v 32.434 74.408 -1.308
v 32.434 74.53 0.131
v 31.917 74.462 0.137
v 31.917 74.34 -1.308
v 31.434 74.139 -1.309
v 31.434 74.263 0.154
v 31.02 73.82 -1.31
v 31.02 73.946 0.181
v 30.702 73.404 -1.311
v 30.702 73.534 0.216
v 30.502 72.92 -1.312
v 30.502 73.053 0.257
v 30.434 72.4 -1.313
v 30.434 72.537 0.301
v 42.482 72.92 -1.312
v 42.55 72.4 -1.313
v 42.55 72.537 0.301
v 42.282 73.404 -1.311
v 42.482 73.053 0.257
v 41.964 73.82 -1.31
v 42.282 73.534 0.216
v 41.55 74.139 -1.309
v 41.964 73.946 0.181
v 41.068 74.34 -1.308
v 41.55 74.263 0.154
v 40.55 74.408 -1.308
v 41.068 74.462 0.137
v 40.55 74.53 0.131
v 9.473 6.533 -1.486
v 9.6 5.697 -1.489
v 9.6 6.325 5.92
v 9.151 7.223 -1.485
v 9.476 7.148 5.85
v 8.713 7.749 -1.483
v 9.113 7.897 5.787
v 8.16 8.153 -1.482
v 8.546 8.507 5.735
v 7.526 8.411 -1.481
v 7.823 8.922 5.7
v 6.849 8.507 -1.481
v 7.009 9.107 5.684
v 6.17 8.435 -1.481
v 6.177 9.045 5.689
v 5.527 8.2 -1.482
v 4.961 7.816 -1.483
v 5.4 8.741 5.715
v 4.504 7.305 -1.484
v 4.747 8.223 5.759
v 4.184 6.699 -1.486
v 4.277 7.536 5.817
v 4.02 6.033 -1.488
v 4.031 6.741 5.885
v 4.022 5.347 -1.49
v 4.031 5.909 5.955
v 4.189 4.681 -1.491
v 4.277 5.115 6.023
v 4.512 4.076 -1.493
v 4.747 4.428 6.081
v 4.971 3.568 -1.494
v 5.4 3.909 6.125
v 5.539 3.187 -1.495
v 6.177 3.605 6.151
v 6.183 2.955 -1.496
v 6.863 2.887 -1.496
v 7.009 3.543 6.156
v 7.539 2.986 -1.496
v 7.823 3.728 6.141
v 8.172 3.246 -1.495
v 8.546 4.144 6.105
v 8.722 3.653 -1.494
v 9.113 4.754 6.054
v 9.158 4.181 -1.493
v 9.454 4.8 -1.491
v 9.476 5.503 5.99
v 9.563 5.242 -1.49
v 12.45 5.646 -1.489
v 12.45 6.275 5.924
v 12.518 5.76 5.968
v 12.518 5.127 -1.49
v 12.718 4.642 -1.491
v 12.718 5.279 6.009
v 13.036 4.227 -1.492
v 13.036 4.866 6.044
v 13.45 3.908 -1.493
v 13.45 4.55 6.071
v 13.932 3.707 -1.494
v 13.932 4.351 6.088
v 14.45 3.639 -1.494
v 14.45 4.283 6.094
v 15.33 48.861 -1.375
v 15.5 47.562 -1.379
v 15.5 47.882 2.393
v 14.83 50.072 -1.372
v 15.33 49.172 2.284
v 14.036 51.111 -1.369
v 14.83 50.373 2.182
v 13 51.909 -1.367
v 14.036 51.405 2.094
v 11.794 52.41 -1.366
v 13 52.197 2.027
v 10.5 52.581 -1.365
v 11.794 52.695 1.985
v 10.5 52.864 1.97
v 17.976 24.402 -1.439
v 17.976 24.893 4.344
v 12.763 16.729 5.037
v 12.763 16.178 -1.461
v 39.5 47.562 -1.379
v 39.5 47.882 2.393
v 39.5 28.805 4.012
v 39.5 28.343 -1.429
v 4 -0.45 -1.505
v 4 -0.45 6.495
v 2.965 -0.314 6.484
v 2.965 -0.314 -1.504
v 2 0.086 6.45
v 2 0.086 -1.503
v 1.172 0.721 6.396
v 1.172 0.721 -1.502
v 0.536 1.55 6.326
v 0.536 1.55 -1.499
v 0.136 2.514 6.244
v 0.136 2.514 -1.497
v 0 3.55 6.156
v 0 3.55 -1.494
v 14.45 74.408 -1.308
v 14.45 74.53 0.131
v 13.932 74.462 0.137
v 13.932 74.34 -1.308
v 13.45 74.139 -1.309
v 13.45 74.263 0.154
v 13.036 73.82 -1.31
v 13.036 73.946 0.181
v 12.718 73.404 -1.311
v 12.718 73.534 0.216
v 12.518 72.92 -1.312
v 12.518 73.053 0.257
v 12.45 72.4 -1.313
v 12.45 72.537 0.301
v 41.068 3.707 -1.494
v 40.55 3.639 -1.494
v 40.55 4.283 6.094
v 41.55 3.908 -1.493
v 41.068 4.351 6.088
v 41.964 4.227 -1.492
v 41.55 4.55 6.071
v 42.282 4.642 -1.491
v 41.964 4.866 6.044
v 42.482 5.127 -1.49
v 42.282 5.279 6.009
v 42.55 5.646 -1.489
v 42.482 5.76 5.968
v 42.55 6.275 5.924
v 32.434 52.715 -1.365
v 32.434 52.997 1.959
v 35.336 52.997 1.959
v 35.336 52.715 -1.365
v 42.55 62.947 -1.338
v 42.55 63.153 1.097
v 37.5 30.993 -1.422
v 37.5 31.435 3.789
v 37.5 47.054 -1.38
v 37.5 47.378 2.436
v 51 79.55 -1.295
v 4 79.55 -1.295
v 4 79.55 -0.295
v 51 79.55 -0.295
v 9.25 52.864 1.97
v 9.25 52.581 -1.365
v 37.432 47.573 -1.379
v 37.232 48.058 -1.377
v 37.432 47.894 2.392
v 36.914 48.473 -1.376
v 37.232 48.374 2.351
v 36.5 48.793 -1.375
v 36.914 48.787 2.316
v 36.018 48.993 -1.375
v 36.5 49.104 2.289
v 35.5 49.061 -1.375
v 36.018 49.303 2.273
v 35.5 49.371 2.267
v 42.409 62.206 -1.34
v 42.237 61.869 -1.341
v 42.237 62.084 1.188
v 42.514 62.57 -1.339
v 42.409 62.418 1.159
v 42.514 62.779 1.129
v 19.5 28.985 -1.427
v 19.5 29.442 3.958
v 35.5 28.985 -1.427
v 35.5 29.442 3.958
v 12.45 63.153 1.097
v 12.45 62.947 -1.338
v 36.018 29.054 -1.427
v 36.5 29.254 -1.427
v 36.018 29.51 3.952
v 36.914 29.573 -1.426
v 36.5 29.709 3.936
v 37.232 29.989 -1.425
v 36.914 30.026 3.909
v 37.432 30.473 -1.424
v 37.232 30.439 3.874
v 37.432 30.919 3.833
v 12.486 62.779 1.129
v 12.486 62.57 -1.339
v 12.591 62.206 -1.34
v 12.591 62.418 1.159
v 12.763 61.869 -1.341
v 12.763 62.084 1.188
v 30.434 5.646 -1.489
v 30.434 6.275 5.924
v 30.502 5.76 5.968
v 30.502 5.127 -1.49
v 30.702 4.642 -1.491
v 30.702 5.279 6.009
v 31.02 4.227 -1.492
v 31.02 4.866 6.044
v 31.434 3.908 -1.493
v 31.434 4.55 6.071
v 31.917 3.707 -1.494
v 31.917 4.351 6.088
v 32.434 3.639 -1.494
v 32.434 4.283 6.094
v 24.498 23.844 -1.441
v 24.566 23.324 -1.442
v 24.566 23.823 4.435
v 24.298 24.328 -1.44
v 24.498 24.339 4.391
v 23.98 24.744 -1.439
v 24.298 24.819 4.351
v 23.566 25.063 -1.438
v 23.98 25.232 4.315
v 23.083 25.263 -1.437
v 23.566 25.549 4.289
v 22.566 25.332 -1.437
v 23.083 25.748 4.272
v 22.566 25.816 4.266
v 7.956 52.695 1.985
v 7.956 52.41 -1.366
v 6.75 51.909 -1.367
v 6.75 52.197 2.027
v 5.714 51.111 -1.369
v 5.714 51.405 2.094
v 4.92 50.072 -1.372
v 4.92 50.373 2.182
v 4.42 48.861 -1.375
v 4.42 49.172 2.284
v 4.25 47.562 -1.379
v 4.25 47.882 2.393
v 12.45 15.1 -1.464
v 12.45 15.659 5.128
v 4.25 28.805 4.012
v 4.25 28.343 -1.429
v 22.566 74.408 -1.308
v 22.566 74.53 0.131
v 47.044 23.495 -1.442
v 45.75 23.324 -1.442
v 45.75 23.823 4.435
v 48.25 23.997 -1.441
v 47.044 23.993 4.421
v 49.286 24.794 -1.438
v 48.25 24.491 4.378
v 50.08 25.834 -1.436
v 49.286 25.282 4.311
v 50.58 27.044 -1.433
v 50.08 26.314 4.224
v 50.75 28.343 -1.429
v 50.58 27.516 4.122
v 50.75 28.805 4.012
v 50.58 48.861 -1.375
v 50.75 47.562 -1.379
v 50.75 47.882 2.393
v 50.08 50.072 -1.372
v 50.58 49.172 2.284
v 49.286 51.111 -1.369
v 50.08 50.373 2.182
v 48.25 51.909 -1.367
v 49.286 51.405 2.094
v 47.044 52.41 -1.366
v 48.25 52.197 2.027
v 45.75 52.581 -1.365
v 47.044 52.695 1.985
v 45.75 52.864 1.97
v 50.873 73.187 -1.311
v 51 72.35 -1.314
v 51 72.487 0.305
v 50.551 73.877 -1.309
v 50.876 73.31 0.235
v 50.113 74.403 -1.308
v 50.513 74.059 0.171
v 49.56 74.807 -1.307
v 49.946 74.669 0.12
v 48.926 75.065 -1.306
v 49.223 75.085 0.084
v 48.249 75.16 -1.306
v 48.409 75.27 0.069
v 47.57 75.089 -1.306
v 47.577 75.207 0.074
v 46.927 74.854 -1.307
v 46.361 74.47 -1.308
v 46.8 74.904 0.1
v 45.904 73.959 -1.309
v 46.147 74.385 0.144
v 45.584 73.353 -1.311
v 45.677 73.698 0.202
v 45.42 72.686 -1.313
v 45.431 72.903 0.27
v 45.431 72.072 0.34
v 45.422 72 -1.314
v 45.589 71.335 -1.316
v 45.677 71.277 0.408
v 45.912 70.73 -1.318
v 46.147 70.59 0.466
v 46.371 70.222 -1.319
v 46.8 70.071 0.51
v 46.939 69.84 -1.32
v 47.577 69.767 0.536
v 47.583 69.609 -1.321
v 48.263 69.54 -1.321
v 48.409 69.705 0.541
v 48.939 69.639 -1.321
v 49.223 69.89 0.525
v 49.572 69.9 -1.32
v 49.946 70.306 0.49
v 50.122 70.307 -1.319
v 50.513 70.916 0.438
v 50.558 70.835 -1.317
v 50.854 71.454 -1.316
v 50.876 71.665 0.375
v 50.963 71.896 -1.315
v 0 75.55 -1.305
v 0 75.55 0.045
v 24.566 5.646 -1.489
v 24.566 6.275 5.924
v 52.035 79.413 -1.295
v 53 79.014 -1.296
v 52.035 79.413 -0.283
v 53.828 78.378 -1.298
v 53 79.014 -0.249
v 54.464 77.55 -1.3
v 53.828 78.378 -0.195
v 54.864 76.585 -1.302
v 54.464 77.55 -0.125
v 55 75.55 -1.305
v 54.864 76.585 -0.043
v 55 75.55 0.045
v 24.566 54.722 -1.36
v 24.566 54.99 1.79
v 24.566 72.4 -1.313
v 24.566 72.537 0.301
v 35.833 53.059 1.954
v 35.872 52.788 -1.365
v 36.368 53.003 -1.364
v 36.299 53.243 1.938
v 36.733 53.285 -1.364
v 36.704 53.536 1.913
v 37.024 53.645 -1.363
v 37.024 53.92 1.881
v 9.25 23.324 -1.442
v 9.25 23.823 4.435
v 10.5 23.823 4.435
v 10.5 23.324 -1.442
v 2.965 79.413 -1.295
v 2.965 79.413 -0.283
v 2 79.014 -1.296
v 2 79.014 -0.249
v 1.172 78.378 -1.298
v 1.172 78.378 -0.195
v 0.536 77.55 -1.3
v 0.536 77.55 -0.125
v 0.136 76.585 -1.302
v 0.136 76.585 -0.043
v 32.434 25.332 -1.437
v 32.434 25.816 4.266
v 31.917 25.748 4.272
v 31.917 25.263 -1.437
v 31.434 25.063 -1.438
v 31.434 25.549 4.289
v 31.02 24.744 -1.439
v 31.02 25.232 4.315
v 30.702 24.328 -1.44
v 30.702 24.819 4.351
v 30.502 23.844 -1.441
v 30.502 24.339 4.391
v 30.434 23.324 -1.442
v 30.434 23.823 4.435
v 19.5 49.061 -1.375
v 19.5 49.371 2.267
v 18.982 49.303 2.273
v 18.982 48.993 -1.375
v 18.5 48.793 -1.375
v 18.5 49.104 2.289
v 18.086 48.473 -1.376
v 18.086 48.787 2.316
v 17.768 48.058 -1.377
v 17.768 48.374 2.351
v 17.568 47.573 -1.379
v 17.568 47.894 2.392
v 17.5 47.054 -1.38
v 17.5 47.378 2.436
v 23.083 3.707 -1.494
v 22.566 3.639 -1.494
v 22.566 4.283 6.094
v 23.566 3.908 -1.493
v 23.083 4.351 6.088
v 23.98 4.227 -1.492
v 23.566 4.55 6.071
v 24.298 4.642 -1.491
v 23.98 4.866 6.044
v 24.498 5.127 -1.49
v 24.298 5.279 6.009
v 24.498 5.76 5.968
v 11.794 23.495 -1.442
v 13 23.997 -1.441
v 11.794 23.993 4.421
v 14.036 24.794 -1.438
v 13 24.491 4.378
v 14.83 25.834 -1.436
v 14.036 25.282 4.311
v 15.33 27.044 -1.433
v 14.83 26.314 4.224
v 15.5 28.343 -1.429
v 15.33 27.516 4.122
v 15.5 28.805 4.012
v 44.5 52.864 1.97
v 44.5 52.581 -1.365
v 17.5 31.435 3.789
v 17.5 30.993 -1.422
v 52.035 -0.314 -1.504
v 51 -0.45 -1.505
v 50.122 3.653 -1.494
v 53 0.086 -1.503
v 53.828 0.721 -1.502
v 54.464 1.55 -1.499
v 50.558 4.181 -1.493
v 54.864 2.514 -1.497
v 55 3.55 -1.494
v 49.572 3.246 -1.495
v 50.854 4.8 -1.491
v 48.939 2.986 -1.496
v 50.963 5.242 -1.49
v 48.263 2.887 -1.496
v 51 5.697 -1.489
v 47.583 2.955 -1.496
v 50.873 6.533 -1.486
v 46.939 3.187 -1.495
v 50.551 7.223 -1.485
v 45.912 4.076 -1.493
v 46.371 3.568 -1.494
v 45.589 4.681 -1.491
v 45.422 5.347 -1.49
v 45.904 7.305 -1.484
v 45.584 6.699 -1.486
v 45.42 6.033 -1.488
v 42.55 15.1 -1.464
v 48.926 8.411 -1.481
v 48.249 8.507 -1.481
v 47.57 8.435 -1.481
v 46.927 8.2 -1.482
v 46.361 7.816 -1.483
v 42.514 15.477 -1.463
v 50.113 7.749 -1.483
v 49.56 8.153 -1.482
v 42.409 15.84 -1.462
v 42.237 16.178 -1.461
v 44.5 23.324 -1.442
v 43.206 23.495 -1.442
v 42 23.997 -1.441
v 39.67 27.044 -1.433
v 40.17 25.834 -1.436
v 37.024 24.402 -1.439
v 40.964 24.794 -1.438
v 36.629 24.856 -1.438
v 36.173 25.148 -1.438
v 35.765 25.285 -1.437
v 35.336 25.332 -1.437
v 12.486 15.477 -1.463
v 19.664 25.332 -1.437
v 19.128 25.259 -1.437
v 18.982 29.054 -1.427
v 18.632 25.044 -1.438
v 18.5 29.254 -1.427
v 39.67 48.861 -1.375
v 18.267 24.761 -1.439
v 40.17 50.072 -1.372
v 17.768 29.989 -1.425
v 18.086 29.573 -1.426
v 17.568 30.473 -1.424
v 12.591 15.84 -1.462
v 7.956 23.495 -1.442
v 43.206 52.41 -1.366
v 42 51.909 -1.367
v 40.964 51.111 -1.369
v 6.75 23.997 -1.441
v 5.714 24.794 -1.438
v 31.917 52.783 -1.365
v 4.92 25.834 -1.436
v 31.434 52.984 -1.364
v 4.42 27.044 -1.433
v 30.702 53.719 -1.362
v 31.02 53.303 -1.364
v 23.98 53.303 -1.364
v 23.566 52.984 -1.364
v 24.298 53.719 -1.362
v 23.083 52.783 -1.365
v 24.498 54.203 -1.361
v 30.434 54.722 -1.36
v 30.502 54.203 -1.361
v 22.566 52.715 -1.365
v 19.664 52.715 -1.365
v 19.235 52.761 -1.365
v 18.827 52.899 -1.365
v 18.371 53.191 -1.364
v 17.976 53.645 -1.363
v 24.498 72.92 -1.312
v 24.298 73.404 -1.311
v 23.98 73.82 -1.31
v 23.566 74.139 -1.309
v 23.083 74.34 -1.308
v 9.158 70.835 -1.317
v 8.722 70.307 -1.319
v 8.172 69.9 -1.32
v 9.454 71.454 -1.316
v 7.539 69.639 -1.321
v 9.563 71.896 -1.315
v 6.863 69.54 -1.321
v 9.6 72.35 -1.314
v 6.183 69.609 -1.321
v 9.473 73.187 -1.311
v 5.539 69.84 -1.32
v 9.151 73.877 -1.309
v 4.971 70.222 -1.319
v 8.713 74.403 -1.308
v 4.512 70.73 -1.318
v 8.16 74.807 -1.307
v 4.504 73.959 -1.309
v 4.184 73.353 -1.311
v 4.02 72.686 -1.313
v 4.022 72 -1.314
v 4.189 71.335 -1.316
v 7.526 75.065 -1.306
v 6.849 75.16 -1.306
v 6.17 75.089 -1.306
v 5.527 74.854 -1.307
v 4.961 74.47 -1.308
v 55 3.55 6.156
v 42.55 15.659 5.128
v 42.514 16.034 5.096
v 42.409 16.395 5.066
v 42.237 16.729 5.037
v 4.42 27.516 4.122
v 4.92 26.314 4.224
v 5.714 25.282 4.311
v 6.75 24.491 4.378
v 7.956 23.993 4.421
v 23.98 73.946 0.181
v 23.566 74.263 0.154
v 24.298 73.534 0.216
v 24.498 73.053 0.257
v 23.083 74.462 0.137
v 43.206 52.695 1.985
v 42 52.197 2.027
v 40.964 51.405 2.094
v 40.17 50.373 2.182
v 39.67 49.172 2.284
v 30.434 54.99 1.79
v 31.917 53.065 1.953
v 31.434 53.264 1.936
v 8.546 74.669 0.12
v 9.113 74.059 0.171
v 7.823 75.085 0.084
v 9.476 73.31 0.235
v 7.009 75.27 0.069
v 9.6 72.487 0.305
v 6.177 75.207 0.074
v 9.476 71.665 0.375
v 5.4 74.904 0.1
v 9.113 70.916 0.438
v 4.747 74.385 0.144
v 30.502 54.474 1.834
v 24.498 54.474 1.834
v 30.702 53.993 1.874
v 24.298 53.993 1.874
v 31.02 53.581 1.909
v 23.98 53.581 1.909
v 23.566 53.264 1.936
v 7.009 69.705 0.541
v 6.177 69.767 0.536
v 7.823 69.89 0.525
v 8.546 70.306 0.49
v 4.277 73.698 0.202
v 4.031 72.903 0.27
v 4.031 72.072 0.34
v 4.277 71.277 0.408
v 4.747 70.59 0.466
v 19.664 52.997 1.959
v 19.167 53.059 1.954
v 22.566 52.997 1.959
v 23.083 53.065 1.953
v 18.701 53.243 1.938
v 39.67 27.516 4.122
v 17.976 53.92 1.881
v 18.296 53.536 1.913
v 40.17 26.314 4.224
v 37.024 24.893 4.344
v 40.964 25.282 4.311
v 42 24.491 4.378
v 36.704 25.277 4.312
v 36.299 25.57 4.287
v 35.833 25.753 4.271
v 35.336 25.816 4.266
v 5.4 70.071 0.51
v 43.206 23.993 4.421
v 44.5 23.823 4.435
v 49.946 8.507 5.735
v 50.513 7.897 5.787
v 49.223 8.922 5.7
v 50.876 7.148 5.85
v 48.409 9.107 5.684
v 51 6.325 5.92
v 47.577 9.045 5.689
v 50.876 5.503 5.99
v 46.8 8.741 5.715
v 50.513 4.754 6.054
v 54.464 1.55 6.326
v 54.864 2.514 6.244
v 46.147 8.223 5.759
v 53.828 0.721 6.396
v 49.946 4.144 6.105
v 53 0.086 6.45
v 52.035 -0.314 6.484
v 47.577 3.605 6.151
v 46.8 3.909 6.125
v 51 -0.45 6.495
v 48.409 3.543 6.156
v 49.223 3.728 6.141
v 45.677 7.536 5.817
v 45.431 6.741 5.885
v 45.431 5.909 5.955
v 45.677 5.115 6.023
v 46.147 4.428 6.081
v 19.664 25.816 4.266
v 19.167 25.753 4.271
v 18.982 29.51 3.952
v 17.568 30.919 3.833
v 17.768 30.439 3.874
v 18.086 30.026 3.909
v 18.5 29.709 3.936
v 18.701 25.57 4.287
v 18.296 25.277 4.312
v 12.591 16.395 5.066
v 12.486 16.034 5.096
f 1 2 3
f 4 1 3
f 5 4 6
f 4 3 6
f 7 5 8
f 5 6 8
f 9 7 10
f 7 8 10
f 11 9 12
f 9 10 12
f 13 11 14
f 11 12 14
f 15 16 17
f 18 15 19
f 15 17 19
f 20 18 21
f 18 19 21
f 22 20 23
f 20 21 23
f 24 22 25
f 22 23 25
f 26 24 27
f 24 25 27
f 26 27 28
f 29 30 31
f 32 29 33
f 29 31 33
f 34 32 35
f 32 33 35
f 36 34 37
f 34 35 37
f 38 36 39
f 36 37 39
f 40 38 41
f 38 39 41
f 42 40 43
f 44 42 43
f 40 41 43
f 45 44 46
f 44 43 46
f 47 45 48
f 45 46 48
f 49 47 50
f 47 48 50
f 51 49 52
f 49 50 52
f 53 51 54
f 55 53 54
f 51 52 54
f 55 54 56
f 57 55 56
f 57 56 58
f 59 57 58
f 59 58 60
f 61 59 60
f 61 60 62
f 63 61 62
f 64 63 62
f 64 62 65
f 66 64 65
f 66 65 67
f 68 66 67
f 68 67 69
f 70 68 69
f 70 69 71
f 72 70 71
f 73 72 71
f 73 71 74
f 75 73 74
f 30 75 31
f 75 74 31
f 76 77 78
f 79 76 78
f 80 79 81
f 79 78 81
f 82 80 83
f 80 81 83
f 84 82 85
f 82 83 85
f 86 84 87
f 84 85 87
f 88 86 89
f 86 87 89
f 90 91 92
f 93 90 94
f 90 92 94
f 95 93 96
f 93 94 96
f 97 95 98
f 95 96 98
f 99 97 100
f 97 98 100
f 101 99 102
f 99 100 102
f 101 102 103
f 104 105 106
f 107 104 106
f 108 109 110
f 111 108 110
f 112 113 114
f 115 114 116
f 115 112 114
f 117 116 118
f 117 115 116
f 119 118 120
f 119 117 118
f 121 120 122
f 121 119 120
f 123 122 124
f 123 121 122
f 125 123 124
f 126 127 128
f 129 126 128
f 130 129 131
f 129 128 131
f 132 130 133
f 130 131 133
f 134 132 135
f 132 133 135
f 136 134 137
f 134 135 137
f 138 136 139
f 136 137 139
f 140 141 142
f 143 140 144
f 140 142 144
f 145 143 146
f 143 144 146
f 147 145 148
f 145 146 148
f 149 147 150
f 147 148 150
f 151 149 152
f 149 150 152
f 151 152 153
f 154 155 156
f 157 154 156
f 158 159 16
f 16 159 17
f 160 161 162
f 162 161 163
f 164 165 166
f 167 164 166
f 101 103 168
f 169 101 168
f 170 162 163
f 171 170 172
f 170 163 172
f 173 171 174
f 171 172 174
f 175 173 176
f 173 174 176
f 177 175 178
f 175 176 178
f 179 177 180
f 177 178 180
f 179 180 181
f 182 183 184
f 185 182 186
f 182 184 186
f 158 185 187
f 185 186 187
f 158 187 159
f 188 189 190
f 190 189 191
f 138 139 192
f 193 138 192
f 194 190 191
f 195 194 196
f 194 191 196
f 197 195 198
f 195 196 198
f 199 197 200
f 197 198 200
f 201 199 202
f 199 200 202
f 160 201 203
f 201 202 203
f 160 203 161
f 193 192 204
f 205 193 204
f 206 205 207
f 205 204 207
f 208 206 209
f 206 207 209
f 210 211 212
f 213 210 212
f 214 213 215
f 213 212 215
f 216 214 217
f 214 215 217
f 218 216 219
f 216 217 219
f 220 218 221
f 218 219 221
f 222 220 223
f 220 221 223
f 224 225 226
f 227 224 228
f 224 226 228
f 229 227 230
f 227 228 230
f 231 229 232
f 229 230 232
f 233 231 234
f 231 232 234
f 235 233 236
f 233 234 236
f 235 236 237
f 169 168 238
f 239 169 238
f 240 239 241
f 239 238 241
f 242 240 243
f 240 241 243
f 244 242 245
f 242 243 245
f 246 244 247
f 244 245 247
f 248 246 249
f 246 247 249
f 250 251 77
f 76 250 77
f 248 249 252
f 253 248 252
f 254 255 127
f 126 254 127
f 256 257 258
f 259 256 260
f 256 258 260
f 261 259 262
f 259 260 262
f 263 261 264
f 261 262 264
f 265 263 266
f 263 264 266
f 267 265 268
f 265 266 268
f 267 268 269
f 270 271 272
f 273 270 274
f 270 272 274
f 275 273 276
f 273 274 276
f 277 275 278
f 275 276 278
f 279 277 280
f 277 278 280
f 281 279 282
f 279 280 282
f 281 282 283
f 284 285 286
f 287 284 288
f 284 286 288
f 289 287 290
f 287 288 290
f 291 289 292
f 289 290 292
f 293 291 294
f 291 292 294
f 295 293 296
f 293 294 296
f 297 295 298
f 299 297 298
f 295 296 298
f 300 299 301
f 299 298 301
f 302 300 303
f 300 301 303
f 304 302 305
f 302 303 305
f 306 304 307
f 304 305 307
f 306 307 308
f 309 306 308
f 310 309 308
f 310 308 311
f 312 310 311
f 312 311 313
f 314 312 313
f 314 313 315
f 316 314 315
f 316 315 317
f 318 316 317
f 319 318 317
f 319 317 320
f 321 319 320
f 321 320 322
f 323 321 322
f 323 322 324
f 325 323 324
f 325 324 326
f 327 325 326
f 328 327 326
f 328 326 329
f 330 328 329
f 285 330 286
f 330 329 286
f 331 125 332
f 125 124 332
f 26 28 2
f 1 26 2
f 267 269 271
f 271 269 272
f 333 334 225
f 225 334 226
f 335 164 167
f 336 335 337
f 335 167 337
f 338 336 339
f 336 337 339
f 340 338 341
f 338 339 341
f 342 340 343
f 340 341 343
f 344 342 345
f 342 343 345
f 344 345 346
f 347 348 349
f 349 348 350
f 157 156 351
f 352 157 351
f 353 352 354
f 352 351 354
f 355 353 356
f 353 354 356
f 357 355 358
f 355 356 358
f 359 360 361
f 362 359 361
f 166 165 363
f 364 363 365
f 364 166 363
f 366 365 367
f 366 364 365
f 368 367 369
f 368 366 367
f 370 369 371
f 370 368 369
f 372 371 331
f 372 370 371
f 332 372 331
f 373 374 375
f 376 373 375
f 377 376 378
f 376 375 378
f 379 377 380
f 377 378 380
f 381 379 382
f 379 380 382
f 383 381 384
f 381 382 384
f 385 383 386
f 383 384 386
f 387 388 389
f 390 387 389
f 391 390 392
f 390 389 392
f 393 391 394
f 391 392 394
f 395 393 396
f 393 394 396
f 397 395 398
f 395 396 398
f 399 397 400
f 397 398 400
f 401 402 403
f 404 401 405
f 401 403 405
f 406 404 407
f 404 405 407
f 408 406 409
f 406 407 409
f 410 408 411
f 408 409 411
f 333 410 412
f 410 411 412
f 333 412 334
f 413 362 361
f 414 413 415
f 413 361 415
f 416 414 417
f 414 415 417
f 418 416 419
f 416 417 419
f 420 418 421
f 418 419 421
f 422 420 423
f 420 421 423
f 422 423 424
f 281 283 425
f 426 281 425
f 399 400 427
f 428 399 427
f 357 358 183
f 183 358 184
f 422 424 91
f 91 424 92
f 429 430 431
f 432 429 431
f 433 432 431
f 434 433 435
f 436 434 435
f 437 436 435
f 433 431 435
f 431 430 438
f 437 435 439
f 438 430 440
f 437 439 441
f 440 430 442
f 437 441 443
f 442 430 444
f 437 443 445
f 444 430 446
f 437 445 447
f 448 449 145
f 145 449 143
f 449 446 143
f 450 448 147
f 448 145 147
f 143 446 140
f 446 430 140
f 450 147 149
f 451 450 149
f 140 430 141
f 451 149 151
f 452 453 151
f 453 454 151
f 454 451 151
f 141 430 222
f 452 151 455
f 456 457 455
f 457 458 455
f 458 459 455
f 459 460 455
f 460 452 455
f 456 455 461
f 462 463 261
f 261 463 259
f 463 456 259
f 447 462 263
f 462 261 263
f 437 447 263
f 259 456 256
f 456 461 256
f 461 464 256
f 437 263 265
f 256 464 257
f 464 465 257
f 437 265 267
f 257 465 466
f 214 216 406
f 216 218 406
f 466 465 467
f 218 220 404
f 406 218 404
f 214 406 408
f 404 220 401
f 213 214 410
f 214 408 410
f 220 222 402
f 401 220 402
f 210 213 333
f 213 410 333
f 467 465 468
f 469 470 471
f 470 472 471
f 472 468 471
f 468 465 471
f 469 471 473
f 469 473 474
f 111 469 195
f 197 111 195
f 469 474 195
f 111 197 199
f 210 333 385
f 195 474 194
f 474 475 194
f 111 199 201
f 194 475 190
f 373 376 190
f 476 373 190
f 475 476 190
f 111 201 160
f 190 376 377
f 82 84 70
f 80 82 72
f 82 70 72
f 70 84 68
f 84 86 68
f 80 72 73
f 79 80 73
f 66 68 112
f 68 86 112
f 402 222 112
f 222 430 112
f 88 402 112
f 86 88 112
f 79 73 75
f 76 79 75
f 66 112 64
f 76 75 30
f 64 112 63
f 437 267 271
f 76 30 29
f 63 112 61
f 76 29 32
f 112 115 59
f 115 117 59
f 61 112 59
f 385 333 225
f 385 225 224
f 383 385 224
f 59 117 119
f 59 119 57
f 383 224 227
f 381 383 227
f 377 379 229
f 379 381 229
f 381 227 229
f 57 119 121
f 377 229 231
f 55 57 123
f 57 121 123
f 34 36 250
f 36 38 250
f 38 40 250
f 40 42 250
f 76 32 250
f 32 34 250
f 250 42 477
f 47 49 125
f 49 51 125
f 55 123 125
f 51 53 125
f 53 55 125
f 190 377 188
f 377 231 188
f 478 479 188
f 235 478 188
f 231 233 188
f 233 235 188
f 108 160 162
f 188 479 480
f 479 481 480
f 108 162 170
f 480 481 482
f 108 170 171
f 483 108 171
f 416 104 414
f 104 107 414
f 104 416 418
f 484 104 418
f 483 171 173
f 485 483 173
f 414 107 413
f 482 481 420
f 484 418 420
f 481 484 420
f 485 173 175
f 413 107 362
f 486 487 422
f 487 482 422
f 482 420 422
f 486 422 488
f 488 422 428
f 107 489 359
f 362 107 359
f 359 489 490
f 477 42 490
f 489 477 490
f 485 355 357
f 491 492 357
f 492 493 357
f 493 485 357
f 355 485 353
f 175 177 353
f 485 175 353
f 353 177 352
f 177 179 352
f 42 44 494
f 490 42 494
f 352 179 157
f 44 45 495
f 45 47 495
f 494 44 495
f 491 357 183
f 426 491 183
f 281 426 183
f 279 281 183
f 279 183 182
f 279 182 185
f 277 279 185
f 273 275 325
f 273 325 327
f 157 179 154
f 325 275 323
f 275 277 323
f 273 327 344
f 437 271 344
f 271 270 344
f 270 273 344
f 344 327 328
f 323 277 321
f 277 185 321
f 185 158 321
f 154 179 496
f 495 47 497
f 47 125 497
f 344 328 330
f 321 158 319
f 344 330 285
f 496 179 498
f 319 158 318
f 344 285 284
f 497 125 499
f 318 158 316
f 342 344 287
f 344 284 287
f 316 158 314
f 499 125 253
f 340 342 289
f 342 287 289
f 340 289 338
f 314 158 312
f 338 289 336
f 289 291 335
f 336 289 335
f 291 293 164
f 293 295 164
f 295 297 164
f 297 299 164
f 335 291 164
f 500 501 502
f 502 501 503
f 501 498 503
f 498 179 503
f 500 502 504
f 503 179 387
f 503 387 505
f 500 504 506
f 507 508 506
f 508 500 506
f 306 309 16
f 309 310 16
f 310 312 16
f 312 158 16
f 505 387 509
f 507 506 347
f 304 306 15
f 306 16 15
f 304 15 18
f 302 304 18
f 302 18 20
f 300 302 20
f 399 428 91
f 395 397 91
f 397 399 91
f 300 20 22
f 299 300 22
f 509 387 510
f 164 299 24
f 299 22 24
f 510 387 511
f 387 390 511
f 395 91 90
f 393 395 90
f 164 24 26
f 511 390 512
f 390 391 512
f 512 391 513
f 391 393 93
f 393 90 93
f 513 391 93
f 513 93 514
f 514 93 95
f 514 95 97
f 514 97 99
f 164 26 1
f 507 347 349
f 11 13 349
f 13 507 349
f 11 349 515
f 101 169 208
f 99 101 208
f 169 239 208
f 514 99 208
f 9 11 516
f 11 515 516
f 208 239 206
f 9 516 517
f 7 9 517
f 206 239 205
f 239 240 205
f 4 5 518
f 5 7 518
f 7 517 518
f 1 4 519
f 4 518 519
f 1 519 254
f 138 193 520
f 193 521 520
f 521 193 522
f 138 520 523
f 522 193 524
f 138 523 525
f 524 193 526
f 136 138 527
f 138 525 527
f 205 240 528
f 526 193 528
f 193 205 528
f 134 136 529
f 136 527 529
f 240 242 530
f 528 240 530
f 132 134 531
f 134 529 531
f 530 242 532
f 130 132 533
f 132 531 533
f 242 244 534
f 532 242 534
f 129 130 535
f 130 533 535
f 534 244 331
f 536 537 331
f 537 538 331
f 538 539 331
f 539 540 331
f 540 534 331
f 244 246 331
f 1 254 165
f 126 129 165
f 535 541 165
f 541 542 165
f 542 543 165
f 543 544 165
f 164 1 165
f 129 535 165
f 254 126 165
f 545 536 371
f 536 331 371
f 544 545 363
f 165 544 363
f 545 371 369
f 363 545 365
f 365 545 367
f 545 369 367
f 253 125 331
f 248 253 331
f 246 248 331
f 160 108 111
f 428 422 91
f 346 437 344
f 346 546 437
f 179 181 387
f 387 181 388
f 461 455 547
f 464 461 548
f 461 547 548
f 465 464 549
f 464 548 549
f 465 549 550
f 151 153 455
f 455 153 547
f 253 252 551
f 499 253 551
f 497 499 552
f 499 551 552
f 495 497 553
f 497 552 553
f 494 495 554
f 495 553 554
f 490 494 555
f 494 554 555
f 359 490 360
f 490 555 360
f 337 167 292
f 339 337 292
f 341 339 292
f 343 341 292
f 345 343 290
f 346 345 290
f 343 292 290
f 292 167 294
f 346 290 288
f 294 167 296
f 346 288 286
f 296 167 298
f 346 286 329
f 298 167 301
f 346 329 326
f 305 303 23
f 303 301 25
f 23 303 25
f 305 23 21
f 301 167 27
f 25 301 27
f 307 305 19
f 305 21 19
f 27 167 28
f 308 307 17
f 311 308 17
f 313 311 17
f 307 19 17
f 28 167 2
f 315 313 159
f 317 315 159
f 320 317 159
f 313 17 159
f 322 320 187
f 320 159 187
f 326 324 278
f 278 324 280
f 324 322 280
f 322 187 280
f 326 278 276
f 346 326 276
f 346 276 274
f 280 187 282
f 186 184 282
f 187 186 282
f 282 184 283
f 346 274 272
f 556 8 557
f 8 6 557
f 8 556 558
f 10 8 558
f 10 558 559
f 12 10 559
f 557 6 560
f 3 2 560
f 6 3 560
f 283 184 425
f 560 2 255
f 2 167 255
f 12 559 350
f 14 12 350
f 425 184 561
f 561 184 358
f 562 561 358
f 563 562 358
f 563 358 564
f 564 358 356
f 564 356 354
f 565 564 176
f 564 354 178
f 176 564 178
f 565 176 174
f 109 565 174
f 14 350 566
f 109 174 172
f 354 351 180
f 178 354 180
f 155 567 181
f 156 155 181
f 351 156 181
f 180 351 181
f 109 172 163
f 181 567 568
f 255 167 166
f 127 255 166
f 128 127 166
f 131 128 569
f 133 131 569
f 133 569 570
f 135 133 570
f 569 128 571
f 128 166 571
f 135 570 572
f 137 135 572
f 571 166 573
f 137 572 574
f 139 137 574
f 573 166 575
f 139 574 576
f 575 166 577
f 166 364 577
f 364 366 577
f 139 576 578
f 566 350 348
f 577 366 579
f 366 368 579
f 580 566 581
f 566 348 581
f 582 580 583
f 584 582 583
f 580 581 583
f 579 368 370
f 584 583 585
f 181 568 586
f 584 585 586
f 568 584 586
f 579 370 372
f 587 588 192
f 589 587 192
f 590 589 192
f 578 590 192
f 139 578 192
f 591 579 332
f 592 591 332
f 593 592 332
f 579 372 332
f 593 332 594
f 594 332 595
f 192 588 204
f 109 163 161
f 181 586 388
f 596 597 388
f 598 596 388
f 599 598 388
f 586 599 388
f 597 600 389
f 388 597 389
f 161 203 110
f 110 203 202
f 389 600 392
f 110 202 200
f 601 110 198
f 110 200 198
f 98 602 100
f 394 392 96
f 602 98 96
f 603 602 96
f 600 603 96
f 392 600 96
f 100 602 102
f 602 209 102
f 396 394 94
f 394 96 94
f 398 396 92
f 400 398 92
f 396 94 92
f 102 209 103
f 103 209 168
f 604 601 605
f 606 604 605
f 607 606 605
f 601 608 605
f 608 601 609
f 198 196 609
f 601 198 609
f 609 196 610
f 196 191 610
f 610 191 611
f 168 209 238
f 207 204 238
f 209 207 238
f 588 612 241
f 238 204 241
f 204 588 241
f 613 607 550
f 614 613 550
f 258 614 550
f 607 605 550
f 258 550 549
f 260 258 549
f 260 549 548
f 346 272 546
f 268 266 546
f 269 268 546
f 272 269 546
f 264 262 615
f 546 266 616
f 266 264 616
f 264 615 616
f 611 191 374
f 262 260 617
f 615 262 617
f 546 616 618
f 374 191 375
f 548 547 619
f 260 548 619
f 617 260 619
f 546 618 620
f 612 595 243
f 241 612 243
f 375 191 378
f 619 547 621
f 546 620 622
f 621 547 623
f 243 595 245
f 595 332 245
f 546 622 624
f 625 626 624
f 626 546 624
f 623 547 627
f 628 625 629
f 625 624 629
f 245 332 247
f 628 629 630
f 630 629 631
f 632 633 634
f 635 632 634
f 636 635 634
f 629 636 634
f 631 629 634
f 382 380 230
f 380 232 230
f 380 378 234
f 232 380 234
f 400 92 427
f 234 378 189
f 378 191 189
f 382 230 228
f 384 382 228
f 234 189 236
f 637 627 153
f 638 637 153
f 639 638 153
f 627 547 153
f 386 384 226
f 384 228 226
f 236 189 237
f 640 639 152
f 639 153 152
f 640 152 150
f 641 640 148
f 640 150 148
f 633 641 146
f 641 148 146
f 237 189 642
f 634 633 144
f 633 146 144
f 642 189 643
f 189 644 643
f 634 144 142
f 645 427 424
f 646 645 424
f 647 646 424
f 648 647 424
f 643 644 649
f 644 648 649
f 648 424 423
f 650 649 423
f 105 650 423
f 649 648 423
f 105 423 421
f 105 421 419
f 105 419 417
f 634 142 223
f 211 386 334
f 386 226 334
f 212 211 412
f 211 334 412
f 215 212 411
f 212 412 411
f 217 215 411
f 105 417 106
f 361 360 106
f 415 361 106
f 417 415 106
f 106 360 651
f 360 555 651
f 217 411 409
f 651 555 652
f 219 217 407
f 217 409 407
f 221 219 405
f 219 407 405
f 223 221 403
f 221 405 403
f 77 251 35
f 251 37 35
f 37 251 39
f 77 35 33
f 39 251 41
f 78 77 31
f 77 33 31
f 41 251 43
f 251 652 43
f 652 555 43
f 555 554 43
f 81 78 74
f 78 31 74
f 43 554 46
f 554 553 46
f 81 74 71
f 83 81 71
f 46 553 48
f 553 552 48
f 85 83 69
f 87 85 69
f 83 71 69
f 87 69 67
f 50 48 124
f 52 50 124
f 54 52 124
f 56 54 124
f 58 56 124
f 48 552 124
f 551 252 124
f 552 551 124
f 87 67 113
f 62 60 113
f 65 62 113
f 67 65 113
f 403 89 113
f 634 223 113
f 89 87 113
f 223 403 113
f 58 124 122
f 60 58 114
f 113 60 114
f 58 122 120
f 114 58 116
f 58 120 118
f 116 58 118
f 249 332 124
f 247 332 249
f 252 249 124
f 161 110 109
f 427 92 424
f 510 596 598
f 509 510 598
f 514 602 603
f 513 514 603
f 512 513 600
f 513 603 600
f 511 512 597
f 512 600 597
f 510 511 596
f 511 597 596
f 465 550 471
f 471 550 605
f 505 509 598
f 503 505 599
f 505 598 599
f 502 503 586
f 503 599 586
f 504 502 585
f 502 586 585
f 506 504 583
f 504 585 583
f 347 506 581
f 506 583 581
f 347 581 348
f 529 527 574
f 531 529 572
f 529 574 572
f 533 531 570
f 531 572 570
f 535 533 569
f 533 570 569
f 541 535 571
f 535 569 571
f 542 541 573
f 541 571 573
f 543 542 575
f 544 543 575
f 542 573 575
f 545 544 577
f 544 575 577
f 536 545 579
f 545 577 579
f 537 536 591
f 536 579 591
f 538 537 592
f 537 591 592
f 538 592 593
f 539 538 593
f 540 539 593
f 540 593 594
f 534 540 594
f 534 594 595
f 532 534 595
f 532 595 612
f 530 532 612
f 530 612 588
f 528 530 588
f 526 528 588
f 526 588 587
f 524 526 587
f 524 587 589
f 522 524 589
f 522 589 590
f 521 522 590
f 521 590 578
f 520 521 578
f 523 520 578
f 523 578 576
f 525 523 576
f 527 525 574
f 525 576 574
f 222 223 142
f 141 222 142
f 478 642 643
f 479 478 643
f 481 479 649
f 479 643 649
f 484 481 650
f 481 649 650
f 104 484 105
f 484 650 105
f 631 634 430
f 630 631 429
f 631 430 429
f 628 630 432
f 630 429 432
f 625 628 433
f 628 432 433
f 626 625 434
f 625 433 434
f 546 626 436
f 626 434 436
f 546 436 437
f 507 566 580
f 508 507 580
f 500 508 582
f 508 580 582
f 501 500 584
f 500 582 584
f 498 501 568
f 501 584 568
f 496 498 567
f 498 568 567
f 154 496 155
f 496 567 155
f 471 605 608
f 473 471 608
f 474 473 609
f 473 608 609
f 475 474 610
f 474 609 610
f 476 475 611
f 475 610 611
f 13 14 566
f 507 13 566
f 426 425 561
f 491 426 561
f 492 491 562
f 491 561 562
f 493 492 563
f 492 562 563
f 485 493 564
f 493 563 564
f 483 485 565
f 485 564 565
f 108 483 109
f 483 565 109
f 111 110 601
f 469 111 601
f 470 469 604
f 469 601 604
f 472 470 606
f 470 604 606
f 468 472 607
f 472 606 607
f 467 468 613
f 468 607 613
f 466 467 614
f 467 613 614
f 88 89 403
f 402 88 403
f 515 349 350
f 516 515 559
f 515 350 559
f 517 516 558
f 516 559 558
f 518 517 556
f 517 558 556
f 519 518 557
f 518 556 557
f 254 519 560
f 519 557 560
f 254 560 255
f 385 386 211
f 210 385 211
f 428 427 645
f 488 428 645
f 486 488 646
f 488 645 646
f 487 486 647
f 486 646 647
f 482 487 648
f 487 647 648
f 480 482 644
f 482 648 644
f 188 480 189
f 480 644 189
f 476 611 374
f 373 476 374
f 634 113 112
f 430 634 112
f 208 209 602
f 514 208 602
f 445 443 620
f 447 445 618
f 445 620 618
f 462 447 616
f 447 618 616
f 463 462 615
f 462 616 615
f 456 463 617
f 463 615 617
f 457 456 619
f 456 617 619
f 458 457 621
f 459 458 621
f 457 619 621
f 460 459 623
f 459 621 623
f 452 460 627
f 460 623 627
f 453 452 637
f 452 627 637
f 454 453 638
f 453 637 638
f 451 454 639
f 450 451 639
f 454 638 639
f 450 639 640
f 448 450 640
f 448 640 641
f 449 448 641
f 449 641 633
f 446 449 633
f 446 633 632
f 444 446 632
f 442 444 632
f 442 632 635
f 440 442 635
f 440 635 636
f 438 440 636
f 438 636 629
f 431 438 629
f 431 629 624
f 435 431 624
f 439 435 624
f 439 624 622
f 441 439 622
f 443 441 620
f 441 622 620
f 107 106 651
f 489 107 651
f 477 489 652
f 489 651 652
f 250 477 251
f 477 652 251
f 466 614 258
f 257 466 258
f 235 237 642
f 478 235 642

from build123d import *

# Parameters (mm, degrees)
F1_DEPTH = 55
F2_R     = 4
F3_R     = 2.8
F4_DEPTH = 25


with BuildPart() as f1:
    # F0 (on Right) → F1 (new body)
    with BuildSketch(Plane.YZ):
        Polygon((-0.4503256133, 6.495247405), (-0.4503256133, -1.504752595), (79.5496743867, -1.2945870653), (79.5496743867, -0.2945870653), align=None)
    extrude(amount=F1_DEPTH)

    # F2
    f2_edges = [f1.edges().sort_by_distance(p)[0] for p in [
        (0, -0.450326, 2.495247),
        (55, -0.450326, 2.495247),
        (0, 79.549674, -0.794587),
        (55, 79.549674, -0.794587),
    ]]
    fillet(f2_edges, radius=F2_R)

    # F3 (on face) → F4 (cut)
    with BuildSketch(Plane(origin=(0, 0.5441073712, 6.4108469631), x_dir=(1, 0, 0), z_dir=(0, 0.0845688851, 0.9964176352))):
        with BuildLine():
            Line((10.5, 52.5083540007), (9.25, 52.5083540007))
            ThreePointArc((9.25, 52.5083540007), (5.7144660941, 51.0438879067), (4.25, 47.5083540007))
            Line((4.25, 47.5083540007), (4.25, 28.3626182626))
            ThreePointArc((4.25, 28.3626182626), (5.7144660941, 24.8270843567), (9.25, 23.3626182626))
            Line((9.25, 23.3626182626), (10.5, 23.3626182626))
            ThreePointArc((10.5, 23.3626182626), (14.0355339059, 24.8270843567), (15.5, 28.3626182626))
            Line((15.5, 28.3626182626), (15.5, 47.5083540007))
            ThreePointArc((15.5, 47.5083540007), (14.0355339059, 51.0438879067), (10.5, 52.5083540007))
        make_face()
        with BuildLine():
            Line((19.5, 29.0019917861), (35.5, 29.0019917861))
            ThreePointArc((35.5, 29.0019917861), (36.9142135624, 29.5877782237), (37.5, 31.0019917861))
            Line((37.5, 31.0019917861), (37.5, 47.0019917861))
            ThreePointArc((37.5, 47.0019917861), (36.9142135624, 48.4162053484), (35.5, 49.0019917861))
            Line((35.5, 49.0019917861), (19.5, 49.0019917861))
            ThreePointArc((19.5, 49.0019917861), (18.0857864376, 48.4162053484), (17.5, 47.0019917861))
            Line((17.5, 47.0019917861), (17.5, 31.0019917861))
            ThreePointArc((17.5, 31.0019917861), (18.0857864376, 29.5877782237), (19.5, 29.0019917861))
        make_face()
        with BuildLine():
            Line((50.75, 28.3626182626), (50.75, 47.5083540007))
            ThreePointArc((50.75, 47.5083540007), (49.2855339059, 51.0438879067), (45.75, 52.5083540007))
            Line((45.75, 52.5083540007), (44.5, 52.5083540007))
            ThreePointArc((44.5, 52.5083540007), (40.9644660941, 51.0438879067), (39.5, 47.5083540007))
            Line((39.5, 47.5083540007), (39.5, 28.3626182626))
            ThreePointArc((39.5, 28.3626182626), (40.9644660941, 24.8270843567), (44.5, 23.3626182626))
            Line((44.5, 23.3626182626), (45.75, 23.3626182626))
            ThreePointArc((45.75, 23.3626182626), (49.2855339059, 24.8270843567), (50.75, 28.3626182626))
        make_face()
        with BuildLine():
            ThreePointArc((22.5658532124, 3.7519917861), (23.9800667747, 4.3377782237), (24.5658532124, 5.7519917861))
            Line((24.5658532124, 5.7519917861), (24.5658532124, 23.3626182626))
            ThreePointArc((24.5658532124, 23.3626182626), (23.9800667747, 24.776831825), (22.5658532124, 25.3626182626))
            Line((22.5658532124, 25.3626182626), (19.6637449961, 25.3626182626))
            ThreePointArc((19.6637449961, 25.3626182626), (18.7013266797, 25.1158298826), (17.9764220206, 24.436369247))
            Line((17.9764220206, 24.436369247), (12.7626770245, 16.243341396))
            ThreePointArc((12.7626770245, 16.243341396), (12.5297596568, 15.7287657192), (12.45, 15.1695904116))
            Line((12.45, 15.1695904116), (12.45, 5.7519917861))
            ThreePointArc((12.45, 5.7519917861), (13.0357864376, 4.3377782237), (14.45, 3.7519917861))
            Line((14.45, 3.7519917861), (22.5658532124, 3.7519917861))
        make_face()
        with BuildLine():
            Line((30.4341467876, 23.3626182626), (30.4341467876, 5.7519917861))
            ThreePointArc((30.4341467876, 5.7519917861), (31.0199332253, 4.3377782237), (32.4341467876, 3.7519917861))
            Line((32.4341467876, 3.7519917861), (40.55, 3.7519917861))
            ThreePointArc((40.55, 3.7519917861), (41.9642135624, 4.3377782237), (42.55, 5.7519917861))
            Line((42.55, 5.7519917861), (42.55, 15.1695904116))
            ThreePointArc((42.55, 15.1695904116), (42.4702403432, 15.7287657192), (42.2373229755, 16.243341396))
            Line((42.2373229755, 16.243341396), (37.0235779794, 24.436369247))
            ThreePointArc((37.0235779794, 24.436369247), (36.2986733203, 25.1158298826), (35.3362550039, 25.3626182626))
            Line((35.3362550039, 25.3626182626), (32.4341467876, 25.3626182626))
            ThreePointArc((32.4341467876, 25.3626182626), (31.0199332253, 24.776831825), (30.4341467876, 23.3626182626))
        make_face()
        with BuildLine():
            ThreePointArc((32.4341467876, 74.2519917861), (31.0199332253, 73.6662053484), (30.4341467876, 72.2519917861))
            Line((30.4341467876, 72.2519917861), (30.4341467876, 54.6413653095))
            ThreePointArc((30.4341467876, 54.6413653095), (31.0199332253, 53.2271517471), (32.4341467876, 52.6413653095))
            Line((32.4341467876, 52.6413653095), (35.3362550039, 52.6413653095))
            ThreePointArc((35.3362550039, 52.6413653095), (36.2986733203, 52.8881536895), (37.0235779794, 53.5676143251))
            Line((37.0235779794, 53.5676143251), (42.2373229755, 61.7606421761))
            ThreePointArc((42.2373229755, 61.7606421761), (42.4702403432, 62.2752178529), (42.55, 62.8343931605))
            Line((42.55, 62.8343931605), (42.55, 72.2519917861))
            ThreePointArc((42.55, 72.2519917861), (41.9642135624, 73.6662053484), (40.55, 74.2519917861))
            Line((40.55, 74.2519917861), (32.4341467876, 74.2519917861))
        make_face()
        with BuildLine():
            Line((22.5658532124, 74.2519917861), (14.45, 74.2519917861))
            ThreePointArc((14.45, 74.2519917861), (13.0357864376, 73.6662053484), (12.45, 72.2519917861))
            Line((12.45, 72.2519917861), (12.45, 62.8343931605))
            ThreePointArc((12.45, 62.8343931605), (12.5297596568, 62.2752178529), (12.7626770245, 61.7606421761))
            Line((12.7626770245, 61.7606421761), (17.9764220206, 53.5676143251))
            ThreePointArc((17.9764220206, 53.5676143251), (18.7013266797, 52.8881536895), (19.6637449961, 52.6413653095))
            Line((19.6637449961, 52.6413653095), (22.5658532124, 52.6413653095))
            ThreePointArc((22.5658532124, 52.6413653095), (23.9800667747, 53.2271517471), (24.5658532124, 54.6413653095))
            Line((24.5658532124, 54.6413653095), (24.5658532124, 72.2519917861))
            ThreePointArc((24.5658532124, 72.2519917861), (23.9800667747, 73.6662053484), (22.5658532124, 74.2519917861))
        make_face()
        with Locations((48.2, 72.2019917861)):
            Circle(F3_R)
        with Locations((48.2, 5.8019917861)):
            Circle(F3_R)
        with Locations((6.8, 5.8019917861)):
            Circle(F3_R)
        with Locations((6.8, 72.2019917861)):
            Circle(F3_R)
    extrude(amount=-F4_DEPTH, mode=Mode.SUBTRACT)


solid = f1.part
